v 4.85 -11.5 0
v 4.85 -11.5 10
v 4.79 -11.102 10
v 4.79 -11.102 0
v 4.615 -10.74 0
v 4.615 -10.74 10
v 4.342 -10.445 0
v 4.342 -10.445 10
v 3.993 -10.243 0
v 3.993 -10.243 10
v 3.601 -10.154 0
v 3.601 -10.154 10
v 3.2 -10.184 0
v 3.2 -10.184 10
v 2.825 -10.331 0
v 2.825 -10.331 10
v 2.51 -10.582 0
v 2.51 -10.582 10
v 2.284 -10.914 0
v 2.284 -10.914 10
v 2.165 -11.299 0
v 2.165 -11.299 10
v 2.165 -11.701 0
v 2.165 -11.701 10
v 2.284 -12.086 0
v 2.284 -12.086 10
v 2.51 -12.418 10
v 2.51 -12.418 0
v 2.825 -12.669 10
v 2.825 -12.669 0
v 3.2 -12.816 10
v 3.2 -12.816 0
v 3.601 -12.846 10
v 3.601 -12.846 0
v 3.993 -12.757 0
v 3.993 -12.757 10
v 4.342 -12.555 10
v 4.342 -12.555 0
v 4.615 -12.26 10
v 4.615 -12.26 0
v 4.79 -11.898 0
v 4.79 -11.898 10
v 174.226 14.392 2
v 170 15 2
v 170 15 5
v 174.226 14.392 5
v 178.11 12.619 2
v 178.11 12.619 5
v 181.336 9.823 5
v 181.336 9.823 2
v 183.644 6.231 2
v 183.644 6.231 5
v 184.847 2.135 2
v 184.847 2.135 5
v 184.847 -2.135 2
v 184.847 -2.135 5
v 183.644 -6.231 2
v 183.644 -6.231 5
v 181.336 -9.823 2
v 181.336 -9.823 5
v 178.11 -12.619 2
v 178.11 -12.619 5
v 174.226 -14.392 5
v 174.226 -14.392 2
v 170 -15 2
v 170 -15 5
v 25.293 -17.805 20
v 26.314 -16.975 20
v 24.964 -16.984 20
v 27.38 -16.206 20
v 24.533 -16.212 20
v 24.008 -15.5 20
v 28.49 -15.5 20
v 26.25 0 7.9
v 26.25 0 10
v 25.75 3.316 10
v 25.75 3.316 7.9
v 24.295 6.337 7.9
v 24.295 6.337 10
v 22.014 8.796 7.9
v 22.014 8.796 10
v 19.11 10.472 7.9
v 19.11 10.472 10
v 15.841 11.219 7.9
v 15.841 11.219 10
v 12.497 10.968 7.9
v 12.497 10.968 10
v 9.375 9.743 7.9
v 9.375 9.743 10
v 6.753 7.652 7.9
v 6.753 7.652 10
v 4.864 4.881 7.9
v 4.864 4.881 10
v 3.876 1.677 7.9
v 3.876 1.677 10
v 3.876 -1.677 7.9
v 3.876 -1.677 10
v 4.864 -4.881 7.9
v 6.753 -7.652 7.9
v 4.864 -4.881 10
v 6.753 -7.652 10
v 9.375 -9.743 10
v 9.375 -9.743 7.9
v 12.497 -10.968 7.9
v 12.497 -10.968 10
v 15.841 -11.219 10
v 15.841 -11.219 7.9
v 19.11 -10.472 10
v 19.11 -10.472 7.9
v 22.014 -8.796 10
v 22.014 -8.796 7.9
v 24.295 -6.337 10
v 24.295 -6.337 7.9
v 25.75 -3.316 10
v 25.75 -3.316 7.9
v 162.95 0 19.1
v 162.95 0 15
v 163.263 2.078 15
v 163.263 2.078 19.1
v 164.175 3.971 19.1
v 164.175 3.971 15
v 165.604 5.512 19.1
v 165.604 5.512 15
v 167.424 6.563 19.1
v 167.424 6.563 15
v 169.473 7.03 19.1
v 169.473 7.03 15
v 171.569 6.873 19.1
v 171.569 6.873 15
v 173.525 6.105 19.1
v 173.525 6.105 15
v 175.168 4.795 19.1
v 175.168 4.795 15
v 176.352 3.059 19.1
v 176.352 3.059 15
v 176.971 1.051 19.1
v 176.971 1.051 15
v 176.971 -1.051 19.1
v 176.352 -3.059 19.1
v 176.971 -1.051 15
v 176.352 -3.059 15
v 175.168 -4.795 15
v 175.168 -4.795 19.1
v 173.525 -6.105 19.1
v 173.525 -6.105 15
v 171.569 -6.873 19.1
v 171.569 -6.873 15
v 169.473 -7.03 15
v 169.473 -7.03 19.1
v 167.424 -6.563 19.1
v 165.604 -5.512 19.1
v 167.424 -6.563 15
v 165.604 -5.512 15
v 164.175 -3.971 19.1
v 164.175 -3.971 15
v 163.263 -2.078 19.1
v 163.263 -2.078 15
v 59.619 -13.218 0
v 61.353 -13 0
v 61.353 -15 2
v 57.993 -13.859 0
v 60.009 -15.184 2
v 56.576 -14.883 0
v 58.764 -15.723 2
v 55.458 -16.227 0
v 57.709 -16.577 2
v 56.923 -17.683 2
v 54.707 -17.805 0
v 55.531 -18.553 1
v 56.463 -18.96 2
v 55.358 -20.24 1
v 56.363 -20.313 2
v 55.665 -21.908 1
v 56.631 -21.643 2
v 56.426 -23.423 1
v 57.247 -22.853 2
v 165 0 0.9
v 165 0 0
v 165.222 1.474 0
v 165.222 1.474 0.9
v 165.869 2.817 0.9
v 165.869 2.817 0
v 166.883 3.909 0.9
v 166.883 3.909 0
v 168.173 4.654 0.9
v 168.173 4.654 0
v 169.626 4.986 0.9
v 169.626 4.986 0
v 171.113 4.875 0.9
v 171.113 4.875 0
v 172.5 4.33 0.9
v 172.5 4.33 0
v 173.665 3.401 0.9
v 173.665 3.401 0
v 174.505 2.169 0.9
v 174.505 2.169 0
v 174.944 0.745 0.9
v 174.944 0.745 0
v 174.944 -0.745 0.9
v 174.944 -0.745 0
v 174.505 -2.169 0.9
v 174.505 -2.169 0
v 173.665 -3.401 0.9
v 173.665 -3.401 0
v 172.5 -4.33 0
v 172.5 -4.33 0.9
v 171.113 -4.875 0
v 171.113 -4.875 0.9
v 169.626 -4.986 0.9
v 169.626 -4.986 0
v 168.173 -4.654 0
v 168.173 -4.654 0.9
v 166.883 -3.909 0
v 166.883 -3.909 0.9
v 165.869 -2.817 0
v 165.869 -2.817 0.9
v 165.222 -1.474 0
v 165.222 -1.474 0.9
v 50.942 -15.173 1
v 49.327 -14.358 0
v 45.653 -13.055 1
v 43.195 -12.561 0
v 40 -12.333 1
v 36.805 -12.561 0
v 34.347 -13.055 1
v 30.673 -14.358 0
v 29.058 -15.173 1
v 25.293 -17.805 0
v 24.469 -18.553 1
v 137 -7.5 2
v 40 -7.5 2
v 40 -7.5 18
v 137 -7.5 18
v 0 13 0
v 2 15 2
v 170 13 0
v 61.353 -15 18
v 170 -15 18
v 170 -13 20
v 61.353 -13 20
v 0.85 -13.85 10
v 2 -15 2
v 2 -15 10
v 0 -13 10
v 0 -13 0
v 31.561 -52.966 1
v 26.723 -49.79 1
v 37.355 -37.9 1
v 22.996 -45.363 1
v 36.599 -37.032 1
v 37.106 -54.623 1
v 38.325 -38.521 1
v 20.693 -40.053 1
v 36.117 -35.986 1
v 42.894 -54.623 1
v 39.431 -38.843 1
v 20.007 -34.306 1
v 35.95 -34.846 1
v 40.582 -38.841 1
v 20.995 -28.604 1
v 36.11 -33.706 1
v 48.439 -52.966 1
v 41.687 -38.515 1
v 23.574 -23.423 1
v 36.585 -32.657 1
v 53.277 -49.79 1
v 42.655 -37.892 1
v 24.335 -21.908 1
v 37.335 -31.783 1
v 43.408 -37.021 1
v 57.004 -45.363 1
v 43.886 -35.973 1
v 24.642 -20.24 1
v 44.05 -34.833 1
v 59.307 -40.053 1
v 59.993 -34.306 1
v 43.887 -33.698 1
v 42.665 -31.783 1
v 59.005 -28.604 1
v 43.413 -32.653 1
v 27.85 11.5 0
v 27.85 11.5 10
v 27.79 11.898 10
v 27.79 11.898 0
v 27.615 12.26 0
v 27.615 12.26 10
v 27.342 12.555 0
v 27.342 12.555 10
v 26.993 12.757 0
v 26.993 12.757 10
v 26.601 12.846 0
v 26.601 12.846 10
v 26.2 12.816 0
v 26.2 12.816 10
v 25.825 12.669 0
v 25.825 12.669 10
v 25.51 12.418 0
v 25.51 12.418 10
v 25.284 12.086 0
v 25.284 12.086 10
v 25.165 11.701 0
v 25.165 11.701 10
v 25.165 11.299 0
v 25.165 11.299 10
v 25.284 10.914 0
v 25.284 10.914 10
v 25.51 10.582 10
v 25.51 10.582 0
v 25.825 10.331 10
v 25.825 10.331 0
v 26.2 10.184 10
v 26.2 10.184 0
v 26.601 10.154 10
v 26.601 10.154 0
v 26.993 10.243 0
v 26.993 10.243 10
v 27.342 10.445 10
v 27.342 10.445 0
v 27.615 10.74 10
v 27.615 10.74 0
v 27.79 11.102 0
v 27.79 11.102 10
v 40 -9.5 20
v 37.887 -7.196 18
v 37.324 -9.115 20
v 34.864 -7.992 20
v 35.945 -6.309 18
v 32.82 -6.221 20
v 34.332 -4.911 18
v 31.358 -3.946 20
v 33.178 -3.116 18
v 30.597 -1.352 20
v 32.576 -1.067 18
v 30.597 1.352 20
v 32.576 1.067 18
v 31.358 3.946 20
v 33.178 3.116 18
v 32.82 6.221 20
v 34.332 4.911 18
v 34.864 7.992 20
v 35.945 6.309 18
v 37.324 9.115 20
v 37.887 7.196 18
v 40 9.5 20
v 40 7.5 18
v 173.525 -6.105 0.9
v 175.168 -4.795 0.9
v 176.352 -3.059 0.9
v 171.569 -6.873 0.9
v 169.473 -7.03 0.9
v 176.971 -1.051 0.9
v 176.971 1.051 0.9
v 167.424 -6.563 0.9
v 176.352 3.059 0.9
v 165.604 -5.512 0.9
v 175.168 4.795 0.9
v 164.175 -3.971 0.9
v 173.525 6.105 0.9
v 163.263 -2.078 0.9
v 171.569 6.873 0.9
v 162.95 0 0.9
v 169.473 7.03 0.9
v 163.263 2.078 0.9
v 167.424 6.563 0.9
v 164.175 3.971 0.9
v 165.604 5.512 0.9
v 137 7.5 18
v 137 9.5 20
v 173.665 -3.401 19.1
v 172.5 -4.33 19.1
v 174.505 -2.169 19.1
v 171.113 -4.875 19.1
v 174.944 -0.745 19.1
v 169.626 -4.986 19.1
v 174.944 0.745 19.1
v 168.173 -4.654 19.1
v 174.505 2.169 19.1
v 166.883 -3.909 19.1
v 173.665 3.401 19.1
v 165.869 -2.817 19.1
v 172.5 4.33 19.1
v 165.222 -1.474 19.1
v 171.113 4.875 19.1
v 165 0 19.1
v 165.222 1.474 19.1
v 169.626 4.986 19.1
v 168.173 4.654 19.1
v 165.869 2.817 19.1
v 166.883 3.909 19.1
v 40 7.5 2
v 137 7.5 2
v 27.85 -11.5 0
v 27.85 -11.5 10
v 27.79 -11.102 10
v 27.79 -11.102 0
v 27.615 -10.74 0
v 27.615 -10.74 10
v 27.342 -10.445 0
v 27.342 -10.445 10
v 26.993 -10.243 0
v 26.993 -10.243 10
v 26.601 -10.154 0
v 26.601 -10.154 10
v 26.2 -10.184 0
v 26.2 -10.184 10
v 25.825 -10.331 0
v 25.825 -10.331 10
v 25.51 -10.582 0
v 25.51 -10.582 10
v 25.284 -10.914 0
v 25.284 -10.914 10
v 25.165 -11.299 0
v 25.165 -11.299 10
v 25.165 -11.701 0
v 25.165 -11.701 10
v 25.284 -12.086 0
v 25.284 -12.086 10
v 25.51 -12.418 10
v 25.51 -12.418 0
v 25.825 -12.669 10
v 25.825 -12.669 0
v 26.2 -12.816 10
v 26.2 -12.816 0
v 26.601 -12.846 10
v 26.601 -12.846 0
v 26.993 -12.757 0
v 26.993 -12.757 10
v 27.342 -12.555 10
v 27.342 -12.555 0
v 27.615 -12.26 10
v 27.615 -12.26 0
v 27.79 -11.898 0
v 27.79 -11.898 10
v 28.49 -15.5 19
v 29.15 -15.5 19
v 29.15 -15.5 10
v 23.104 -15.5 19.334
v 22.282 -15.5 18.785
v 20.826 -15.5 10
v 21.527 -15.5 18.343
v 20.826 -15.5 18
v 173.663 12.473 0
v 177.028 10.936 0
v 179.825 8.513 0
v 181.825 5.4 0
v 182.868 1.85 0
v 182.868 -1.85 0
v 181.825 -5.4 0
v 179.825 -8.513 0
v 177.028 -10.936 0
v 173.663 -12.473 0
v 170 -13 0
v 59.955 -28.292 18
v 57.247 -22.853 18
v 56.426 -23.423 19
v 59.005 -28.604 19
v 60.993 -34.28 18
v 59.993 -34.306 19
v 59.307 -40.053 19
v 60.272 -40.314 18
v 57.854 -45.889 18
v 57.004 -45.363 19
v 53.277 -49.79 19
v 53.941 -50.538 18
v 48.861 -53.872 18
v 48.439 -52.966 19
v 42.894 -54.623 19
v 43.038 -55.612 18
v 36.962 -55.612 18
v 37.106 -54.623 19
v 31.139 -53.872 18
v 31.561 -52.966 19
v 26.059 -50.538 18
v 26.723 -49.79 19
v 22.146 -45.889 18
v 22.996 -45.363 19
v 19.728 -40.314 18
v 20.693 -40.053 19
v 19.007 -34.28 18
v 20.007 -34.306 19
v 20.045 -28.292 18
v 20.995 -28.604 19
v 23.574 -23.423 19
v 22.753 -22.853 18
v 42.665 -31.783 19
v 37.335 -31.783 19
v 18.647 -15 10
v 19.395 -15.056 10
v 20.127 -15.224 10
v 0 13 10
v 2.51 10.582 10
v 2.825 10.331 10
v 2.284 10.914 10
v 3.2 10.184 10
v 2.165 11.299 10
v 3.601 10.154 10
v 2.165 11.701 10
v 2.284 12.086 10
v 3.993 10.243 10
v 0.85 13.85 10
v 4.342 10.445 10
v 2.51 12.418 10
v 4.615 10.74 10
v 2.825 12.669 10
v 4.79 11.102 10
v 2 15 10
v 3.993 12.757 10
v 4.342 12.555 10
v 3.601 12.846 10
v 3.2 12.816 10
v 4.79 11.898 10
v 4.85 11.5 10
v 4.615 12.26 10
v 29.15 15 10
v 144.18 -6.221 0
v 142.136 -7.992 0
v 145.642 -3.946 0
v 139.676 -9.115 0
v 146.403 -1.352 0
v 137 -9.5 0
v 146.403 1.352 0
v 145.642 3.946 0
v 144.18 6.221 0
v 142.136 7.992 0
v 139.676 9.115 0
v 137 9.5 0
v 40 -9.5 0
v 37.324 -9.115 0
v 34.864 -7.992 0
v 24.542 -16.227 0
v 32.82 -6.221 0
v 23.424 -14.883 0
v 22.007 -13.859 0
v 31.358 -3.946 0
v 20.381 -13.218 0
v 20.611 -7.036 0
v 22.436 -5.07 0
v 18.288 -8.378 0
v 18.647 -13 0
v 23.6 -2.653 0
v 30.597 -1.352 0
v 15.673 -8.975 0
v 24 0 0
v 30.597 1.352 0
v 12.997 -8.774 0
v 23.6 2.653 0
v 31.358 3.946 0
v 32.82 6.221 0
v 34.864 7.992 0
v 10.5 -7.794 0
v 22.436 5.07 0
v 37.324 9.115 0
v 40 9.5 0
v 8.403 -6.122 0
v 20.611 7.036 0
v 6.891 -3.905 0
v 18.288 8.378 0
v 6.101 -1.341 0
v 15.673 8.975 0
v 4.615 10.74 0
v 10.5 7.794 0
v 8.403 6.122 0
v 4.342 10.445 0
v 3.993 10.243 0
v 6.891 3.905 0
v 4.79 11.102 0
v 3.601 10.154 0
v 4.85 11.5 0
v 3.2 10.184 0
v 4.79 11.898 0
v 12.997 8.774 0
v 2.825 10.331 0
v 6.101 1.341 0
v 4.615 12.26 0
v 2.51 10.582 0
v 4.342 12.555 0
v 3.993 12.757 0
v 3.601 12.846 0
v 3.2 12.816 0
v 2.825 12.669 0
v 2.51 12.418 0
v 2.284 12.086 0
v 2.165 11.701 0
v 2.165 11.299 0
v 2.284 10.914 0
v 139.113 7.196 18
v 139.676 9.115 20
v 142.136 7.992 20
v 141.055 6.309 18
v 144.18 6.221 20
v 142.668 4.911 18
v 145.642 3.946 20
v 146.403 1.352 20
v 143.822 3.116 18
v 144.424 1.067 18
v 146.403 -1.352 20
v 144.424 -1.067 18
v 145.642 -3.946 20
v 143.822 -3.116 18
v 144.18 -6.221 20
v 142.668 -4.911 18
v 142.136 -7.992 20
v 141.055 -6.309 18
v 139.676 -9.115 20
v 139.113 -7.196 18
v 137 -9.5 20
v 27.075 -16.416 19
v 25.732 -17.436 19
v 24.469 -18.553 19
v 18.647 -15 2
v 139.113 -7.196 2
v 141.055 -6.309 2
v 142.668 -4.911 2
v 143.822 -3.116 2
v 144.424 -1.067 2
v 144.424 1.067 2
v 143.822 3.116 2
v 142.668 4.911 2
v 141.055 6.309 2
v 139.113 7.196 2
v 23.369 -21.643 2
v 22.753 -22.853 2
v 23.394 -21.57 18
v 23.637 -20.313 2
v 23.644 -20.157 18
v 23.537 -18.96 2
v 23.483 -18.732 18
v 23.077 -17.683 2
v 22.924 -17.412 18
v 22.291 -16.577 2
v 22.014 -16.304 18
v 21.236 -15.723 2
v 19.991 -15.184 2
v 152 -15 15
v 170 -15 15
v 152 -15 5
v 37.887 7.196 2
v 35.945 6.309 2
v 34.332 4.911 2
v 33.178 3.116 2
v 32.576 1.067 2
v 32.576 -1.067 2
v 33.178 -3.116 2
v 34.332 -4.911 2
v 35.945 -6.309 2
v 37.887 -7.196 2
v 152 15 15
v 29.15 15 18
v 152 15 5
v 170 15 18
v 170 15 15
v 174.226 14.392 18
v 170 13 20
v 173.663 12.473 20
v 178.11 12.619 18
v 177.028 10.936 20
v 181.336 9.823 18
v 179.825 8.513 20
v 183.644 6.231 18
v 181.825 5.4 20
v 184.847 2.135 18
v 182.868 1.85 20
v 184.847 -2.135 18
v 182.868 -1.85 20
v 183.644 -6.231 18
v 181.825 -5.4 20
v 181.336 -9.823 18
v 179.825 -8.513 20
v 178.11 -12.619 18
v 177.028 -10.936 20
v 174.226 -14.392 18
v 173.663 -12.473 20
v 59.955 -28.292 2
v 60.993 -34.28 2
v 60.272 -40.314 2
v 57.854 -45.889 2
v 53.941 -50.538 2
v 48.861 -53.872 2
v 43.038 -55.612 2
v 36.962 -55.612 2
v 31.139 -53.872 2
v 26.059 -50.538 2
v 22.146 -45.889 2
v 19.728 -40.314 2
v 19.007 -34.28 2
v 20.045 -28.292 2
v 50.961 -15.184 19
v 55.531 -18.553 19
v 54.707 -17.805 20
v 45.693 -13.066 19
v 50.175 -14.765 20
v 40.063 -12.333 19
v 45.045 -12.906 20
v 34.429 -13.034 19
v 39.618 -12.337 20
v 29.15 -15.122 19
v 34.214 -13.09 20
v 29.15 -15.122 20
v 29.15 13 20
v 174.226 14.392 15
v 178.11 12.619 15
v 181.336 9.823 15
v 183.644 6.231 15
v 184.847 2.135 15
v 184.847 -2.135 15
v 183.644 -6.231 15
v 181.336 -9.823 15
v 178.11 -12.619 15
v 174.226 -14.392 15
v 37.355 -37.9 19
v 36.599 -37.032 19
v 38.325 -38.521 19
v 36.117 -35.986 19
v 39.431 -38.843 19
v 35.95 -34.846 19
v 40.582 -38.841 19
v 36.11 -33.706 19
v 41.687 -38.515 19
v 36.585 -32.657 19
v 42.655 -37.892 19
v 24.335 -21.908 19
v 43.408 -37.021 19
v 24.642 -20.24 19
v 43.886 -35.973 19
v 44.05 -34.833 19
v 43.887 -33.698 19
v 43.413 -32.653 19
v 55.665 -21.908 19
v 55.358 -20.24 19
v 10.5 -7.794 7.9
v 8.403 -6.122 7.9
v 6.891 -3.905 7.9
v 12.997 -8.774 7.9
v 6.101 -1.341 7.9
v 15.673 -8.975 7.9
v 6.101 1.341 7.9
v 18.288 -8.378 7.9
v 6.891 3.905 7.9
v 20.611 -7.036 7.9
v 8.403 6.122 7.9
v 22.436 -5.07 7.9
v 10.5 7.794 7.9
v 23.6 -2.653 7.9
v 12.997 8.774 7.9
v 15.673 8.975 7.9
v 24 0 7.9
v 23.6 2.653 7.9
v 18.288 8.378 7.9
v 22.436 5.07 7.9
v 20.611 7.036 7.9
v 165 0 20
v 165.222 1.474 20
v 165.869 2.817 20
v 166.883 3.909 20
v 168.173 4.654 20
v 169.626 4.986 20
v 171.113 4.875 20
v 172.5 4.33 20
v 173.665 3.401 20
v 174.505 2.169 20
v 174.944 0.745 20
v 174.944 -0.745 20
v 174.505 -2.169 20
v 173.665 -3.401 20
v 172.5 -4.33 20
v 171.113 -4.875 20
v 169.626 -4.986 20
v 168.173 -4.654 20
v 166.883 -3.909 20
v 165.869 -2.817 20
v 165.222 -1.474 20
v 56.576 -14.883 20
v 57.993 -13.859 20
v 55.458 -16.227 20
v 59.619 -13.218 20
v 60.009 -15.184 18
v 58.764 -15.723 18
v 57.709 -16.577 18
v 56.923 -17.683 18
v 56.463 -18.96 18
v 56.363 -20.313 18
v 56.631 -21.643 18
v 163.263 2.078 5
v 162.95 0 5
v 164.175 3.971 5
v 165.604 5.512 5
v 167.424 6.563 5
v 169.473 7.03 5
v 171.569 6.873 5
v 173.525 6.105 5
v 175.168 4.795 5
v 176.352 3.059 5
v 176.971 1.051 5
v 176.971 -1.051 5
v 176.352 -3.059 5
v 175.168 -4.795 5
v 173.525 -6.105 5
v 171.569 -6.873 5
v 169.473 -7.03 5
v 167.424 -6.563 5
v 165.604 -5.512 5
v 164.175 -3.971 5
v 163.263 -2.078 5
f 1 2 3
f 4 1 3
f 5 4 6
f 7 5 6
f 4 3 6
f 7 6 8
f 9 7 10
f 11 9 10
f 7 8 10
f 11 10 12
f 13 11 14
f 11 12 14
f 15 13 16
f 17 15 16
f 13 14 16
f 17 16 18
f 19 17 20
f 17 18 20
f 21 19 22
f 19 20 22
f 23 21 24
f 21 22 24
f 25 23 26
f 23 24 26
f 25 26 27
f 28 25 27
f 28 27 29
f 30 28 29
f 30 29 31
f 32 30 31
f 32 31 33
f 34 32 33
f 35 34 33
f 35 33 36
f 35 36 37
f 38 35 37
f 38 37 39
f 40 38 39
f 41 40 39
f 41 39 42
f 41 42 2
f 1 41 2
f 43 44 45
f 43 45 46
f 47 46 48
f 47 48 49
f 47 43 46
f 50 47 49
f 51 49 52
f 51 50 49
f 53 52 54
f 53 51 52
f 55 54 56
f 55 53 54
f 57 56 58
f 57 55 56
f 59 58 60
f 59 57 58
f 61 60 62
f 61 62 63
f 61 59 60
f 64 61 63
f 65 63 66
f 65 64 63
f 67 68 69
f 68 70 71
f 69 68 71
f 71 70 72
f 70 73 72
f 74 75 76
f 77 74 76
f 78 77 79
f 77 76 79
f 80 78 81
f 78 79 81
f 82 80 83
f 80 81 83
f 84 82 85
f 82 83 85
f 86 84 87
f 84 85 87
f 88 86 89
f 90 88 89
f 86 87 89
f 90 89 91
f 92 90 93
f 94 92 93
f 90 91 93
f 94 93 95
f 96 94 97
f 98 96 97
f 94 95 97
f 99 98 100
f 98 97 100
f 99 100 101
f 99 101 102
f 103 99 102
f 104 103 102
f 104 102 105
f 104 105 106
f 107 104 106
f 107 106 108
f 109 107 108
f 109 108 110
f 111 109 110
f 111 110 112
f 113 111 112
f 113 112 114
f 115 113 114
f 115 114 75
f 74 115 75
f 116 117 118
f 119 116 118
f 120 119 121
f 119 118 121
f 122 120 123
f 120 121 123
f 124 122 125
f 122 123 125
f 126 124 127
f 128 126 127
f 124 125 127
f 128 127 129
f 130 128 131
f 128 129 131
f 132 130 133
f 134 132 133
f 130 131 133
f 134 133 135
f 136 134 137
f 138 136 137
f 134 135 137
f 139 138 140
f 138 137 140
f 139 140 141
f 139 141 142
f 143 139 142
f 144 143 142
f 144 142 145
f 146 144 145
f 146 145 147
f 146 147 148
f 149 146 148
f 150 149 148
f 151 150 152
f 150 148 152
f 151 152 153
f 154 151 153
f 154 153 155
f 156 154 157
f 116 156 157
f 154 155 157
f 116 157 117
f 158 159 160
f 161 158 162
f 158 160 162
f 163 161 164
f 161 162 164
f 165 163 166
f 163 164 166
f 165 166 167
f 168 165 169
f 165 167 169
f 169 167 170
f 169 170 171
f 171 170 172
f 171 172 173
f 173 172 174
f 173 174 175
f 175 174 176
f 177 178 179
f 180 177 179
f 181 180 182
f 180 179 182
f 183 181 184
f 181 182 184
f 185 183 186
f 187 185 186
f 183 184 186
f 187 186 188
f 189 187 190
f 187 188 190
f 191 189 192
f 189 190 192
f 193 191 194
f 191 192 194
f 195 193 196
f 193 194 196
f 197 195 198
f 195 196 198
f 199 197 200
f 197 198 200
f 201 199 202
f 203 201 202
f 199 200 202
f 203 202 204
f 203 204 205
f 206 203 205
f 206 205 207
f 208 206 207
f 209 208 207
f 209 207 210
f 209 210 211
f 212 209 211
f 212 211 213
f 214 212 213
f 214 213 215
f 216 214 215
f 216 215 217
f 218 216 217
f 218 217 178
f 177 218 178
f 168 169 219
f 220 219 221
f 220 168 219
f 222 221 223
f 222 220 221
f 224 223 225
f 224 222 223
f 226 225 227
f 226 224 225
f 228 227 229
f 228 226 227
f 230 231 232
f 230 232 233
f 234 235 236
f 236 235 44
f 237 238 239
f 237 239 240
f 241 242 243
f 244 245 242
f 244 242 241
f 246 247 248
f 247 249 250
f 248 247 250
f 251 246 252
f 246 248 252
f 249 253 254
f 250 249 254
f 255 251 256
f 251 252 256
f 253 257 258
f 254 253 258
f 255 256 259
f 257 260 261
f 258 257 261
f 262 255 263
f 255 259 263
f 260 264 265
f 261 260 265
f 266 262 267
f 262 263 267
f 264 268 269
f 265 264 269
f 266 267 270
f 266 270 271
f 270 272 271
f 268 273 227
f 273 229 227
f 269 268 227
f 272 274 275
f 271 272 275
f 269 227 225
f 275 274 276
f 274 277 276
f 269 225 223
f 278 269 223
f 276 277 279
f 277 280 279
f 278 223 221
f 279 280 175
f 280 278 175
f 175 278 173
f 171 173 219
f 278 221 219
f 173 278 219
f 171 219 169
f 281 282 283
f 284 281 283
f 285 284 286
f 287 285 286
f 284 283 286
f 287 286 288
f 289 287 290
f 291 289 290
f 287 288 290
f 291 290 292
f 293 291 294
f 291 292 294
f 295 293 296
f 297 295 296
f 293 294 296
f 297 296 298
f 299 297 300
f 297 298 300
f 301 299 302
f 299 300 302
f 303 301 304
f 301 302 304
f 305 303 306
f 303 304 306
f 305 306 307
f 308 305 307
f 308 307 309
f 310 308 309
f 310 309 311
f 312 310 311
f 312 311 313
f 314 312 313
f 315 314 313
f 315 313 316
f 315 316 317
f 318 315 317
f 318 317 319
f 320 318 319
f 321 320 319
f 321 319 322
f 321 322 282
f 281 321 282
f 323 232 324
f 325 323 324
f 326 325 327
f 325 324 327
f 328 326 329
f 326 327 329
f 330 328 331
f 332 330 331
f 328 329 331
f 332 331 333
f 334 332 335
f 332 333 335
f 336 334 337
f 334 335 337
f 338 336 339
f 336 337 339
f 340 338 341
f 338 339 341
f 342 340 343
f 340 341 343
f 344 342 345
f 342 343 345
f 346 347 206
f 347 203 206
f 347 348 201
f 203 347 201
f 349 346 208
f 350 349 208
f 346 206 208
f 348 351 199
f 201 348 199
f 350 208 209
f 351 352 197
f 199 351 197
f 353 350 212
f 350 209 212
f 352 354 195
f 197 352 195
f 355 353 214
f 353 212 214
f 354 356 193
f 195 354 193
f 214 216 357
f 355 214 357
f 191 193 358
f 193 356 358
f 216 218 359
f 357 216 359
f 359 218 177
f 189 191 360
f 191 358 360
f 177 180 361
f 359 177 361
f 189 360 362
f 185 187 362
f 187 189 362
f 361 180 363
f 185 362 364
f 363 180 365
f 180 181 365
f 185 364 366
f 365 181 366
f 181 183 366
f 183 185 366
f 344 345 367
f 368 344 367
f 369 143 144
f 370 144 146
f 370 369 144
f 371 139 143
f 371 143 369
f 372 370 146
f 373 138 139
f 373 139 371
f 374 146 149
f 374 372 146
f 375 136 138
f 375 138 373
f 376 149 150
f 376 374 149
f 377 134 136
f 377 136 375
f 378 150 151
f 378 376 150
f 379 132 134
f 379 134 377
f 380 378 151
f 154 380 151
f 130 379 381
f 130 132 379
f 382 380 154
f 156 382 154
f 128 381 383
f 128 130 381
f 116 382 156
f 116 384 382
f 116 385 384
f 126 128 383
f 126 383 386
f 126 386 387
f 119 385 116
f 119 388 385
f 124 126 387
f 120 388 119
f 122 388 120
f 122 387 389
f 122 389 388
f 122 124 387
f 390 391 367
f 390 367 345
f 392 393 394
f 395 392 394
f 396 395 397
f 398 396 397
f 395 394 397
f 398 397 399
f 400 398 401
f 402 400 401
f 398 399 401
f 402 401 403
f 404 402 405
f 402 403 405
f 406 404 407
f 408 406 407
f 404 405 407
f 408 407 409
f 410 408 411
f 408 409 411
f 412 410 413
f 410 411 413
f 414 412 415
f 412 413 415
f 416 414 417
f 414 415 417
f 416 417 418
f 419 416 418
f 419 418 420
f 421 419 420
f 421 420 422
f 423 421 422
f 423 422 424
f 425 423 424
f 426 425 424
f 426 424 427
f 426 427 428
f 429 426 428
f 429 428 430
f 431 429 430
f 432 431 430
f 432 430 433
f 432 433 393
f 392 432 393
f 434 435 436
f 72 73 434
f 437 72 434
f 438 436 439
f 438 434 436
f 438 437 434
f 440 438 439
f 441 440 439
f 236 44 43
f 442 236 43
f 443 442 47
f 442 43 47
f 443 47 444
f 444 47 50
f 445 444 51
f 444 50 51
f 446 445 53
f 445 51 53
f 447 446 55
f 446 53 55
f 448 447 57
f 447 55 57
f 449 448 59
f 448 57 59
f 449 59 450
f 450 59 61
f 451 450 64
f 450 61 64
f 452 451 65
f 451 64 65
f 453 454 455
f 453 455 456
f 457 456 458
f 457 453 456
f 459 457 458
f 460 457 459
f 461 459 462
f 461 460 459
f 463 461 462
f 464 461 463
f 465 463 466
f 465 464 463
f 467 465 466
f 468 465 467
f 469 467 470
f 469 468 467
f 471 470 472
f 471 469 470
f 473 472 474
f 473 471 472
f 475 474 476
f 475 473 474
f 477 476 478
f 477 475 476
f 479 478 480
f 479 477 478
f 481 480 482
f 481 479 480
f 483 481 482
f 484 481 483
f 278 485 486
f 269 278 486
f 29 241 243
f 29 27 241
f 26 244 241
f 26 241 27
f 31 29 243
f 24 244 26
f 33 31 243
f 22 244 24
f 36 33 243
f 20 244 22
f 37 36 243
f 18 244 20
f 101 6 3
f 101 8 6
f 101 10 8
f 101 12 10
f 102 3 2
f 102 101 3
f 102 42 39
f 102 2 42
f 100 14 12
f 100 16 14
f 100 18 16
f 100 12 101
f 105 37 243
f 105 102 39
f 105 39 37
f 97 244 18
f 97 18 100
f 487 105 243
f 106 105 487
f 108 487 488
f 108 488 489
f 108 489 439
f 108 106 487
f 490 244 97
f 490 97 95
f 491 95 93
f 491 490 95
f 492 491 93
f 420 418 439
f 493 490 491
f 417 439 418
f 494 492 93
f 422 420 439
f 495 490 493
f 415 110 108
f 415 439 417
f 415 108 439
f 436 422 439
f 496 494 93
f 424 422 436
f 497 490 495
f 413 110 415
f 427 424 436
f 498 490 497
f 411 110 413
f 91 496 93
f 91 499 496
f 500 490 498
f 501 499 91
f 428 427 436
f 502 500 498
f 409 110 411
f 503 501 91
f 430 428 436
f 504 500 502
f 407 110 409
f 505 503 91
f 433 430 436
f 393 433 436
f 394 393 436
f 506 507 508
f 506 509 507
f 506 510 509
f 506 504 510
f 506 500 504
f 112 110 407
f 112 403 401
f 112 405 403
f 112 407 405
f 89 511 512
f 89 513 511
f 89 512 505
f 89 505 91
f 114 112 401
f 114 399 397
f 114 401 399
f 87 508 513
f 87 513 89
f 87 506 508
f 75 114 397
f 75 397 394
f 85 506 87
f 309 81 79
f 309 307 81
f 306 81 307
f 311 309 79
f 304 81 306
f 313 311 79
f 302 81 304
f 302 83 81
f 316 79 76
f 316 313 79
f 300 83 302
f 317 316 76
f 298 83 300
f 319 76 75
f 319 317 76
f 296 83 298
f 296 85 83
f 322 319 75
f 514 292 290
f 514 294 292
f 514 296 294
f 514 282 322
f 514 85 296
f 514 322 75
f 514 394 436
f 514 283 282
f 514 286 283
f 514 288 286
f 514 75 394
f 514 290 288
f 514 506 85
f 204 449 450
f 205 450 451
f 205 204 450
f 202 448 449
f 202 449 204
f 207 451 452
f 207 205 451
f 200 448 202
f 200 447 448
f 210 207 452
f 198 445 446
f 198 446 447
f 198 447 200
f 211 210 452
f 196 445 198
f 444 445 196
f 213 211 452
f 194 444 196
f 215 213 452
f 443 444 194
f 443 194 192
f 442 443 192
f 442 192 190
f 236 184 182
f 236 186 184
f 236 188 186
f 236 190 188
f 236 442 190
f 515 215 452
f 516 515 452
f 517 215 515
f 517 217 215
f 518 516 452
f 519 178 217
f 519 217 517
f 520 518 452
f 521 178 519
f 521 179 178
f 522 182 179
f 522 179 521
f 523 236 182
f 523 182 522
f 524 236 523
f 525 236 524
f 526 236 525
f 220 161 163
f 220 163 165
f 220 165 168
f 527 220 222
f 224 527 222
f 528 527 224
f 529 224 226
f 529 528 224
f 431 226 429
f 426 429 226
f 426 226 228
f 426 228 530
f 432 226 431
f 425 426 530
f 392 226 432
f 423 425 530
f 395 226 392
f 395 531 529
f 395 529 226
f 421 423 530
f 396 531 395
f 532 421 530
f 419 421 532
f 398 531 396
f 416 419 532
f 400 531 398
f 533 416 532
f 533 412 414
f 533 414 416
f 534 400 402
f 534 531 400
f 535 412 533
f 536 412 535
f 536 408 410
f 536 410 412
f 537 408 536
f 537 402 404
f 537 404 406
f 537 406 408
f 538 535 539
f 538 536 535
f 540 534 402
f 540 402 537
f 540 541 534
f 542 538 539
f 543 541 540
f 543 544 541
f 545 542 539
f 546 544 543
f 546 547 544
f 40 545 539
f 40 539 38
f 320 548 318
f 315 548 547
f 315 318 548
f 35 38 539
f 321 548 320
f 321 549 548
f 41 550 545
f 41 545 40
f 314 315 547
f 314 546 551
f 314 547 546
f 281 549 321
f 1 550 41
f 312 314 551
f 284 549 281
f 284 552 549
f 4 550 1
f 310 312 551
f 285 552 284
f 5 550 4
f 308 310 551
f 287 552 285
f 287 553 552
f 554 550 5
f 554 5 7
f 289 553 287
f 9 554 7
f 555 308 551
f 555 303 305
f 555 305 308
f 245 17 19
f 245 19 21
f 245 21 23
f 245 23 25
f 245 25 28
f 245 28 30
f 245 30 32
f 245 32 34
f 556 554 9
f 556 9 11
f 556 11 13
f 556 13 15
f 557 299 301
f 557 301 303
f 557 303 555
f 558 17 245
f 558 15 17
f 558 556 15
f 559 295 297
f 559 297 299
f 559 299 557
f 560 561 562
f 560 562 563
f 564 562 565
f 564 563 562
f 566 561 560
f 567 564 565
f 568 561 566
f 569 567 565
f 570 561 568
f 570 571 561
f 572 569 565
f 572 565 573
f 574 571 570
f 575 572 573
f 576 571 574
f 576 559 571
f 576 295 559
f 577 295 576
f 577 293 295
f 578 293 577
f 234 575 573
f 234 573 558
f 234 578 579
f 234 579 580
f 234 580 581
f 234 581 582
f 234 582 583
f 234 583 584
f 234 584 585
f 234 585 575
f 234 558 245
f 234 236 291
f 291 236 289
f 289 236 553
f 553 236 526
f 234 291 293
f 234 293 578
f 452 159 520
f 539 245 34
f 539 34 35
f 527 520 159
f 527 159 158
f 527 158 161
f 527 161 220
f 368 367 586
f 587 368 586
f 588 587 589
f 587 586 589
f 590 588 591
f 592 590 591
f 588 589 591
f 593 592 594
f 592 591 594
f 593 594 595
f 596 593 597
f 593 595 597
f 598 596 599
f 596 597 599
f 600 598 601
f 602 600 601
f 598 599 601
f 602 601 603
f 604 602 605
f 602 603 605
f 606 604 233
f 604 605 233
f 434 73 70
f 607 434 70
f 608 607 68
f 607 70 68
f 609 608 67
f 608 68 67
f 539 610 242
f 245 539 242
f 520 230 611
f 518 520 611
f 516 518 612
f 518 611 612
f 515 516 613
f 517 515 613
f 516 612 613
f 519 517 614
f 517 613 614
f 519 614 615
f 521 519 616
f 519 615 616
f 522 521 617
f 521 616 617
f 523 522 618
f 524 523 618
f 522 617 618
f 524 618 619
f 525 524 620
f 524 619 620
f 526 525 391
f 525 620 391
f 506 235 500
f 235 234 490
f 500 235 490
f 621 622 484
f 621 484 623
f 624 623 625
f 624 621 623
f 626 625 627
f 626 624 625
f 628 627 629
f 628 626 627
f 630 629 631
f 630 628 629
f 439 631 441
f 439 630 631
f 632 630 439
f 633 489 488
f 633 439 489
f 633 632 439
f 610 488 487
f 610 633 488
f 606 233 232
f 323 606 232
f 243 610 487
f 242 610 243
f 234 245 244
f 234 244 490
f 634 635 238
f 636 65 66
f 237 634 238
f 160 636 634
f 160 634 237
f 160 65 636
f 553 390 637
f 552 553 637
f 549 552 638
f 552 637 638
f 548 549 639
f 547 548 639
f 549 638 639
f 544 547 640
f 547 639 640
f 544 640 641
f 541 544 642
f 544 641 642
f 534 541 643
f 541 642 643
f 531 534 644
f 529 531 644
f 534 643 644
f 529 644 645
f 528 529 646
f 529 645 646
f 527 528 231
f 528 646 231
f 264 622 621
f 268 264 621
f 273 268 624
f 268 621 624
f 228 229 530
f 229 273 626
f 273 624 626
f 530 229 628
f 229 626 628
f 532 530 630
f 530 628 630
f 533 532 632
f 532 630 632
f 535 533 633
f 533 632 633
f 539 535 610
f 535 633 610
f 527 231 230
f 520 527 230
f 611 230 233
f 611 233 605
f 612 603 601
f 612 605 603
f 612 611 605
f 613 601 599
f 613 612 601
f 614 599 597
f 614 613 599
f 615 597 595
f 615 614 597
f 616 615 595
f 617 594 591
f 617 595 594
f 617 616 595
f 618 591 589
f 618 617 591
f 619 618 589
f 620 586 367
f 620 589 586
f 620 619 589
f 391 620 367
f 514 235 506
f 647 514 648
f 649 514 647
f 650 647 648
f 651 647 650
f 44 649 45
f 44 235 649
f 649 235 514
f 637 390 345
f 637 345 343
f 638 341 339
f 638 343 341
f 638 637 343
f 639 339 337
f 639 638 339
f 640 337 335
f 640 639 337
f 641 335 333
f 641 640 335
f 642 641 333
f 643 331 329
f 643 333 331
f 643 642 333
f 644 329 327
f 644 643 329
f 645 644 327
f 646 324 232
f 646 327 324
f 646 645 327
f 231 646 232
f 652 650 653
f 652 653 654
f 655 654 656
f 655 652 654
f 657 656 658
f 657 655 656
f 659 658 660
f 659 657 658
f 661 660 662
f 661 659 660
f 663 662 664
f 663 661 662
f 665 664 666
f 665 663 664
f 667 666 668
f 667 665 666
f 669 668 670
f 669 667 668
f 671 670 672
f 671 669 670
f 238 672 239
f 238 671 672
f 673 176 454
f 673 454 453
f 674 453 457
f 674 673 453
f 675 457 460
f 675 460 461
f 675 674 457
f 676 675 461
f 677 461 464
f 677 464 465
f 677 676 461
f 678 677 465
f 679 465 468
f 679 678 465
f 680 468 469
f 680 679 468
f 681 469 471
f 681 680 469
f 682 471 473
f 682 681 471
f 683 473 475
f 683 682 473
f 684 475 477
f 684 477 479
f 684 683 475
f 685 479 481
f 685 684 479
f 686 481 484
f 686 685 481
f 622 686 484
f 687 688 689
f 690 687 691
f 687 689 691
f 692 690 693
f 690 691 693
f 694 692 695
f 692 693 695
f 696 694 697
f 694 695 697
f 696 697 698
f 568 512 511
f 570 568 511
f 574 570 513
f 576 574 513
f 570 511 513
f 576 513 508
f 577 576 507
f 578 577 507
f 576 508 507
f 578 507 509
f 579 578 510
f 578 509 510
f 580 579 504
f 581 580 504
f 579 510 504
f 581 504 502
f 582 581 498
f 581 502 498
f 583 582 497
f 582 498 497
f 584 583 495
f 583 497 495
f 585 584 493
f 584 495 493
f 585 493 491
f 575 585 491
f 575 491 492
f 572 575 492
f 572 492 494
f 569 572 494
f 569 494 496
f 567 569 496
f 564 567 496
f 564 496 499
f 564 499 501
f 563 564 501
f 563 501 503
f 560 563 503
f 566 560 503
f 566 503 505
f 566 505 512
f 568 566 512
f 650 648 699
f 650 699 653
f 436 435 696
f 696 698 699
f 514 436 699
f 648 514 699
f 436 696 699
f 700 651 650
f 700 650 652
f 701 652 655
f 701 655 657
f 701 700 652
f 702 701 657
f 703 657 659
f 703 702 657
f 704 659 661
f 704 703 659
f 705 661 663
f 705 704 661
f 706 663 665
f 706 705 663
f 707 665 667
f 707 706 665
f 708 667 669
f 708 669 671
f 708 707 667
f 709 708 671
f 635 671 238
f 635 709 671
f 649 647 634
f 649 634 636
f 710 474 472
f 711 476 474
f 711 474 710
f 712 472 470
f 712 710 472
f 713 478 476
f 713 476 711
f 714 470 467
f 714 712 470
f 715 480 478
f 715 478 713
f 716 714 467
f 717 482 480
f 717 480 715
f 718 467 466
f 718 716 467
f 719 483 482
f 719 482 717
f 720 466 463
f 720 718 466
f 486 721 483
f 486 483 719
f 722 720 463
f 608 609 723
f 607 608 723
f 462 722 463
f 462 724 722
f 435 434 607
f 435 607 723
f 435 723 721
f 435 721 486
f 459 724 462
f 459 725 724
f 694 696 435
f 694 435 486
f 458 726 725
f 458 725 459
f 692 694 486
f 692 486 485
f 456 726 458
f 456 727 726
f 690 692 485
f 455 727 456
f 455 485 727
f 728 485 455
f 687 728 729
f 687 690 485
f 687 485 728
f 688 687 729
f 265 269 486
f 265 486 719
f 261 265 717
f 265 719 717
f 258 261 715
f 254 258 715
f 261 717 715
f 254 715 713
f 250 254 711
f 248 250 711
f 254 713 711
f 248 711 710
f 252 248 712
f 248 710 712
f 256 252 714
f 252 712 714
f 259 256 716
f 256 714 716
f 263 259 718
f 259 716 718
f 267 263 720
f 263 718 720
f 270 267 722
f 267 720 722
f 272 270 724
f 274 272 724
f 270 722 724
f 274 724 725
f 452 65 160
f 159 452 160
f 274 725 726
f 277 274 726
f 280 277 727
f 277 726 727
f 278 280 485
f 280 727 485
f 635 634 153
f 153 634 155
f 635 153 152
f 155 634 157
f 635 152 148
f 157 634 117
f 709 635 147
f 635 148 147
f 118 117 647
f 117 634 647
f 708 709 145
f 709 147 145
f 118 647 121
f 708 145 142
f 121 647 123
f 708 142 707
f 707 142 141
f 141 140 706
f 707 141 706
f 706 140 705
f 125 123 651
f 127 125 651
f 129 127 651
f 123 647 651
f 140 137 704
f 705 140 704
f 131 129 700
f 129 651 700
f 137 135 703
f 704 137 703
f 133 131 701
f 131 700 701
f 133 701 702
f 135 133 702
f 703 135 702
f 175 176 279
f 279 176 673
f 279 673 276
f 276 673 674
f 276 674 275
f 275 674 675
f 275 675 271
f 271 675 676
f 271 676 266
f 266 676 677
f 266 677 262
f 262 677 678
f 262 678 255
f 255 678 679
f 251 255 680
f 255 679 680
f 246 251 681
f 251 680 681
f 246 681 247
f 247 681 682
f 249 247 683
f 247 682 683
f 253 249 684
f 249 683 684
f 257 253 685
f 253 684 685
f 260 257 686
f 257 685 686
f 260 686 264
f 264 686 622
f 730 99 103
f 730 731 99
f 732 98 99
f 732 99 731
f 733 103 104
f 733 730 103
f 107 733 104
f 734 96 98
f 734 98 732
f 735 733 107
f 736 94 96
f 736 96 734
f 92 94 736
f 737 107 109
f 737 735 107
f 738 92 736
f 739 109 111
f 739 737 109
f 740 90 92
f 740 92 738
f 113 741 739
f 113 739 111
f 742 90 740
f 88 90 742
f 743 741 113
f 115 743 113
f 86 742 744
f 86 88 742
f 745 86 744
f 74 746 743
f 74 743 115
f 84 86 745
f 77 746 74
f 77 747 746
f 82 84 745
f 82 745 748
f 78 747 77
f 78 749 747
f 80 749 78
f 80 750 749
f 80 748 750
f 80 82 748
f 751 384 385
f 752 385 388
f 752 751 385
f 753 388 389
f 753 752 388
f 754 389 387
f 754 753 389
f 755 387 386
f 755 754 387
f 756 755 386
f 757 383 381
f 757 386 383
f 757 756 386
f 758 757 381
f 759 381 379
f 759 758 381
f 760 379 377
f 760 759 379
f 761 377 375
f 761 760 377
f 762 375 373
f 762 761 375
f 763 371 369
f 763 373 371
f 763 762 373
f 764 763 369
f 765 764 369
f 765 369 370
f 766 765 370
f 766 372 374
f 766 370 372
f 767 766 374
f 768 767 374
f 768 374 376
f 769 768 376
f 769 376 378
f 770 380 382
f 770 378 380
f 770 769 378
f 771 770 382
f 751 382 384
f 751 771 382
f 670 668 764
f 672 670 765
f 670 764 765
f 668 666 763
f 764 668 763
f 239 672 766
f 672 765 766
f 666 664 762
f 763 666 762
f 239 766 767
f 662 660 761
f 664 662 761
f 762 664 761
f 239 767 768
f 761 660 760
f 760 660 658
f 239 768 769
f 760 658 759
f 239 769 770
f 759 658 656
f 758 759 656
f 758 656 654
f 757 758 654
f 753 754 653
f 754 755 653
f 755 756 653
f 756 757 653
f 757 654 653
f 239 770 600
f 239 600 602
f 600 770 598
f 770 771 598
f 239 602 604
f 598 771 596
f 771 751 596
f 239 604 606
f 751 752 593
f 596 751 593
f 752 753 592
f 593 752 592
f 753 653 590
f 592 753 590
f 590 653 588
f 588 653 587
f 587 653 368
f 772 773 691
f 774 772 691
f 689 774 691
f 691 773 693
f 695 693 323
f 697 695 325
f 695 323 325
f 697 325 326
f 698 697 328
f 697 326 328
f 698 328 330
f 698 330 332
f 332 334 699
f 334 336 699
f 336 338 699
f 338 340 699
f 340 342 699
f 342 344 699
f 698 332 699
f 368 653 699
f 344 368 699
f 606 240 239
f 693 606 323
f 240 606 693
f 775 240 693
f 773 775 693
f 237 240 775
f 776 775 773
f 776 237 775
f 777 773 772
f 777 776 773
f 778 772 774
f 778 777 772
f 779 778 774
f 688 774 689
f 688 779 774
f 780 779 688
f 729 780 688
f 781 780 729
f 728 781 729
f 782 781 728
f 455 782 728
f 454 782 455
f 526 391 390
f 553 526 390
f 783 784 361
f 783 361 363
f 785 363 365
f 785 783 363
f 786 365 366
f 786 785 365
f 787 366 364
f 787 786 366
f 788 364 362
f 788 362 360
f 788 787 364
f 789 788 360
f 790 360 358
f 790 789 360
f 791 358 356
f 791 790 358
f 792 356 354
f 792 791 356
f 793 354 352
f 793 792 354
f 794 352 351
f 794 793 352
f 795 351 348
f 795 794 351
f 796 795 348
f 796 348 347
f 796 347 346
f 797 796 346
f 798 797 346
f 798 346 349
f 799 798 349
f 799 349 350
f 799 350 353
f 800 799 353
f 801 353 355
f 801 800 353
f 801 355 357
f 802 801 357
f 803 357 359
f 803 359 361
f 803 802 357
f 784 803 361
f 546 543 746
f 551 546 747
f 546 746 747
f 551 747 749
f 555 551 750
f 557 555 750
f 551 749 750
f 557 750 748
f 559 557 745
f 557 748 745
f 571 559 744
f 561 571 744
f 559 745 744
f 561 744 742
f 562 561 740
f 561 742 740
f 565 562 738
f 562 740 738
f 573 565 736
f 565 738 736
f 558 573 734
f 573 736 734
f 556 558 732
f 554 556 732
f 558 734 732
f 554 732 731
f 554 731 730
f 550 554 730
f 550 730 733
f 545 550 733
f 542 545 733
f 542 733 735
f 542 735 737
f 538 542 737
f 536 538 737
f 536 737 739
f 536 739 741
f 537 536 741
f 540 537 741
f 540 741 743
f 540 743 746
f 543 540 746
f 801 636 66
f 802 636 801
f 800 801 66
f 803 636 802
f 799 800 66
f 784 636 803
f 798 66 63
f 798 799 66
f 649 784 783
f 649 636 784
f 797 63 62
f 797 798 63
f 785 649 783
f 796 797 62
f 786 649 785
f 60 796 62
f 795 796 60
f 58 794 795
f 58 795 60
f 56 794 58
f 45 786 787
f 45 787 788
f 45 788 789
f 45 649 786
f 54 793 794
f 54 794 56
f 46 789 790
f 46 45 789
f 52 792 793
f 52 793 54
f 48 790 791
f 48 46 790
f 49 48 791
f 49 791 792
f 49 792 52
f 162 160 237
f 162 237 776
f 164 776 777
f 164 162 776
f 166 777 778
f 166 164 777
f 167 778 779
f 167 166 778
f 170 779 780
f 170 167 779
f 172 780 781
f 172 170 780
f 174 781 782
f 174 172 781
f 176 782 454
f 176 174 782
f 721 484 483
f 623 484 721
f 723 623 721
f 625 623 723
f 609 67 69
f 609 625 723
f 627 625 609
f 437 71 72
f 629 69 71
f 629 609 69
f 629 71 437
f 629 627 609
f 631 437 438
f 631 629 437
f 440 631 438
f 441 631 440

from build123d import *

# Parameters (mm, degrees)
EXTRUDE_1_DEPTH      = 20
CHAMFER_1_SIZE       = 2
SKETCH_5_R           = 5
CUT_EXTRUDE_4_DEPTH  = 5
SKETCH_3_W           = 36
SKETCH_3_H           = 10
CUT_EXTRUDE_2_DEPTH  = 200.103917213
CUT_EXTRUDE_3_DEPTH  = 195.273950902
CHAMFER_2_SIZE       = 2
CHAMFER_3_SIZE       = 2
CHAMFER_4_SIZE       = 2
CUT_EXTRUDE_START    = -20
SKETCH_8_W           = 28.3
SKETCH_8_H           = 31
CUT_EXTRUDE_5_DEPTH  = 10
SKETCH_9_R           = 11.25
CUT_EXTRUDE_6_DEPTH  = 2.1
SKETCH_9_3_R         = 1.35
CUT_EXTRUDE_7_DEPTH  = 194.500304907
CUT_EXTRUDE_8_DEPTH  = 195.273950902
SKETCH_11_W          = 21.182127439
SKETCH_11_H          = 11.878785241
CUT_EXTRUDE_9_DEPTH  = 200.103917213
SKETCH_12_R          = 9
CUT_EXTRUDE_10_DEPTH = 194.62019006
SKETCH_13_R          = 7.05
CUT_EXTRUDE_11_DEPTH = 4.1
SKETCH_14_R          = 22.5
CUT_EXTRUDE_12_DEPTH = 1


with BuildPart() as part:
    # 草图1 → 凸台-拉伸1 (new body)
    with BuildSketch(Plane.XY):
        with BuildLine():
            Line((0, 15), (170, 15))
            ThreePointArc((170, 15), (185, 0), (170, -15))
            Line((170, -15), (61.353463239, -15))
            ThreePointArc((61.353463239, -15), (56.922725161, -17.682984659), (57.247028001, -22.852575965))
            ThreePointArc((57.247028001, -22.852575965), (40, -55.833395016), (22.752971999, -22.852575965))
            ThreePointArc((22.752971999, -22.852575965), (23.077274839, -17.682984659), (18.646536761, -15))
            Line((18.646536761, -15), (0, -15))
            Line((0, -15), (0, 15))
        make_face()
    extrude(amount=EXTRUDE_1_DEPTH)

    # 倒角1
    chamfer_1_edges = [part.edges().sort_by_distance(p)[0] for p in [
        (0, -15, 10),
        (0, 15, 10),
    ]]
    chamfer(chamfer_1_edges, length=CHAMFER_1_SIZE)

    # 草图5 → 切除-拉伸4 (cut)
    with BuildSketch(Plane(origin=(0, 0, 0), x_dir=(-1, 0, 0), z_dir=(0, 0, -1))):
        with Locations((-170, 0)):
            Circle(SKETCH_5_R)
    cut_extrude_4 = extrude(amount=-CUT_EXTRUDE_4_DEPTH, mode=Mode.SUBTRACT)

    # 草图3 → 切除-拉伸2 (cut, through all)
    with BuildSketch(Plane(origin=(0, 15, 0), x_dir=(1, 0, 0), z_dir=(0, 1, 0))):
        with Locations((170, -10)):
            Rectangle(SKETCH_3_W, SKETCH_3_H)
    extrude(amount=-CUT_EXTRUDE_2_DEPTH, mode=Mode.SUBTRACT)

    # 草图4 → 切除-拉伸3 (cut, through all)
    with BuildSketch(Plane(origin=(0, 0, 0), x_dir=(-1, 0, 0), z_dir=(0, 0, -1))):
        with BuildLine():
            Line((-40, -7.5), (-137, -7.5))
            ThreePointArc((-137, -7.5), (-144.5, 0), (-137, 7.5))
            Line((-137, 7.5), (-40, 7.5))
            ThreePointArc((-40, 7.5), (-32.5, 0), (-40, -7.5))
        make_face()
    extrude(amount=-CUT_EXTRUDE_3_DEPTH, mode=Mode.SUBTRACT)

    # 倒角2
    chamfer_2_edges = [part.edges().sort_by_distance(p)[0] for p in [
        (32.5, 0, 20),
        (88.5, -7.5, 20),
        (144.5, 0, 20),
        (88.5, 7.5, 20),
        (32.5, 0, 0),
        (88.5, 7.5, 0),
        (144.5, 0, 0),
        (88.5, -7.5, 0),
    ]]
    chamfer(chamfer_2_edges, length=CHAMFER_2_SIZE)

    # 倒角3
    chamfer_3_edges = [part.edges().sort_by_distance(p)[0] for p in [
        (10.323268381, -15, 0),
        (23.077274839, -17.682984659, 0),
        (40, -55.833395016, 0),
        (56.922725161, -17.682984659, 0),
        (115.676731619, -15, 0),
        (185, 0, 0),
        (86, 15, 0),
    ]]
    chamfer(chamfer_3_edges, length=CHAMFER_3_SIZE)

    # 倒角4
    chamfer_4_edges = [part.edges().sort_by_distance(p)[0] for p in [
        (10.323268381, -15, 20),
        (23.077274839, -17.682984659, 20),
        (40, -55.833395016, 20),
        (56.922725161, -17.682984659, 20),
        (115.676731619, -15, 20),
        (185, 0, 20),
        (86, 15, 20),
    ]]
    chamfer(chamfer_4_edges, length=CHAMFER_4_SIZE)

    # 镜向1: 切除-拉伸4 across plane
    add(cut_extrude_4.mirror(Plane(origin=(0, 0, 10), x_dir=(1, 0, 0), z_dir=(0, 0, -1))), mode=Mode.SUBTRACT)

    # 草图8 → 切除-拉伸5 (cut)
    with BuildSketch(Plane(origin=(0, 0, 0), x_dir=(-1, 0, 0), z_dir=(0, 0, -1)).offset(CUT_EXTRUDE_START)):
        with Locations((-15, 0)):
            Rectangle(SKETCH_8_W, SKETCH_8_H)
    extrude(amount=CUT_EXTRUDE_5_DEPTH, mode=Mode.SUBTRACT)

    # 草图9 → 切除-拉伸6 (cut)
    with BuildSketch(Plane.XY.offset(10)):
        with Locations((15, 0)):
            Circle(SKETCH_9_R)
    extrude(amount=-CUT_EXTRUDE_6_DEPTH, mode=Mode.SUBTRACT)

    # 草图9<3> → 切除-拉伸7 (cut, through all)
    with BuildSketch(Plane.XY.offset(10)):
        with Locations((26.5, 11.5)):
            Circle(SKETCH_9_3_R)
        with Locations((3.5, 11.5)):
            Circle(SKETCH_9_3_R)
        with Locations((3.5, -11.5)):
            Circle(SKETCH_9_3_R)
        with Locations((26.5, -11.5)):
            Circle(SKETCH_9_3_R)
    extrude(amount=-CUT_EXTRUDE_7_DEPTH, mode=Mode.SUBTRACT)

    # 草图10 → 切除-拉伸8 (cut, through all)
    with BuildSketch(Plane.XY.offset(20)):
        with BuildLine():
            Line((42.664582519, -31.783395016), (37.335417481, -31.783395016))
            ThreePointArc((37.335417481, -31.783395016), (38.32504615, -38.520810046), (44.05, -34.833395016))
            ThreePointArc((44.05, -34.833395016), (43.68741503, -33.158441166), (42.664582519, -31.783395016))
        make_face()
    extrude(amount=-CUT_EXTRUDE_8_DEPTH, mode=Mode.SUBTRACT)

    # 草图11 → 切除-拉伸9 (cut, through all)
    with BuildSketch(Plane(origin=(0, 15, 0), x_dir=(1, 0, 0), z_dir=(0, 1, 0))):
        with Locations((1.235913402, -15.939392621)):
            Rectangle(SKETCH_11_W, SKETCH_11_H)
    extrude(amount=-CUT_EXTRUDE_9_DEPTH, mode=Mode.SUBTRACT)

    # 草图12 → 切除-拉伸10 (cut, through all)
    with BuildSketch(Plane.XY.offset(7.9)):
        with Locations((15, 0)):
            Circle(SKETCH_12_R)
    extrude(amount=-CUT_EXTRUDE_10_DEPTH, mode=Mode.SUBTRACT)

    # 草图13 → 切除-拉伸11 (cut)
    with BuildSketch(Plane(origin=(0, 0, 15), x_dir=(-1, 0, 0), z_dir=(0, 0, -1))):
        with Locations((-170, 0)):
            Circle(SKETCH_13_R)
    cut_extrude_11 = extrude(amount=-CUT_EXTRUDE_11_DEPTH, mode=Mode.SUBTRACT)

    # 镜向2: 切除-拉伸11 across plane
    add(cut_extrude_11.mirror(Plane(origin=(0, 0, 10), x_dir=(1, 0, 0), z_dir=(0, 0, -1))), mode=Mode.SUBTRACT)

    # 草图14 → 切除-拉伸12 (cut)
    with BuildSketch(Plane.XY.offset(20)):
        with Locations((40, -34.833395016)):
            Circle(SKETCH_14_R)
    cut_extrude_12 = extrude(amount=-CUT_EXTRUDE_12_DEPTH, mode=Mode.SUBTRACT)

    # 镜向3: 切除-拉伸12 across plane
    add(cut_extrude_12.mirror(Plane(origin=(0, 0, 10), x_dir=(1, 0, 0), z_dir=(0, 0, -1))), mode=Mode.SUBTRACT)


solid = part.part
